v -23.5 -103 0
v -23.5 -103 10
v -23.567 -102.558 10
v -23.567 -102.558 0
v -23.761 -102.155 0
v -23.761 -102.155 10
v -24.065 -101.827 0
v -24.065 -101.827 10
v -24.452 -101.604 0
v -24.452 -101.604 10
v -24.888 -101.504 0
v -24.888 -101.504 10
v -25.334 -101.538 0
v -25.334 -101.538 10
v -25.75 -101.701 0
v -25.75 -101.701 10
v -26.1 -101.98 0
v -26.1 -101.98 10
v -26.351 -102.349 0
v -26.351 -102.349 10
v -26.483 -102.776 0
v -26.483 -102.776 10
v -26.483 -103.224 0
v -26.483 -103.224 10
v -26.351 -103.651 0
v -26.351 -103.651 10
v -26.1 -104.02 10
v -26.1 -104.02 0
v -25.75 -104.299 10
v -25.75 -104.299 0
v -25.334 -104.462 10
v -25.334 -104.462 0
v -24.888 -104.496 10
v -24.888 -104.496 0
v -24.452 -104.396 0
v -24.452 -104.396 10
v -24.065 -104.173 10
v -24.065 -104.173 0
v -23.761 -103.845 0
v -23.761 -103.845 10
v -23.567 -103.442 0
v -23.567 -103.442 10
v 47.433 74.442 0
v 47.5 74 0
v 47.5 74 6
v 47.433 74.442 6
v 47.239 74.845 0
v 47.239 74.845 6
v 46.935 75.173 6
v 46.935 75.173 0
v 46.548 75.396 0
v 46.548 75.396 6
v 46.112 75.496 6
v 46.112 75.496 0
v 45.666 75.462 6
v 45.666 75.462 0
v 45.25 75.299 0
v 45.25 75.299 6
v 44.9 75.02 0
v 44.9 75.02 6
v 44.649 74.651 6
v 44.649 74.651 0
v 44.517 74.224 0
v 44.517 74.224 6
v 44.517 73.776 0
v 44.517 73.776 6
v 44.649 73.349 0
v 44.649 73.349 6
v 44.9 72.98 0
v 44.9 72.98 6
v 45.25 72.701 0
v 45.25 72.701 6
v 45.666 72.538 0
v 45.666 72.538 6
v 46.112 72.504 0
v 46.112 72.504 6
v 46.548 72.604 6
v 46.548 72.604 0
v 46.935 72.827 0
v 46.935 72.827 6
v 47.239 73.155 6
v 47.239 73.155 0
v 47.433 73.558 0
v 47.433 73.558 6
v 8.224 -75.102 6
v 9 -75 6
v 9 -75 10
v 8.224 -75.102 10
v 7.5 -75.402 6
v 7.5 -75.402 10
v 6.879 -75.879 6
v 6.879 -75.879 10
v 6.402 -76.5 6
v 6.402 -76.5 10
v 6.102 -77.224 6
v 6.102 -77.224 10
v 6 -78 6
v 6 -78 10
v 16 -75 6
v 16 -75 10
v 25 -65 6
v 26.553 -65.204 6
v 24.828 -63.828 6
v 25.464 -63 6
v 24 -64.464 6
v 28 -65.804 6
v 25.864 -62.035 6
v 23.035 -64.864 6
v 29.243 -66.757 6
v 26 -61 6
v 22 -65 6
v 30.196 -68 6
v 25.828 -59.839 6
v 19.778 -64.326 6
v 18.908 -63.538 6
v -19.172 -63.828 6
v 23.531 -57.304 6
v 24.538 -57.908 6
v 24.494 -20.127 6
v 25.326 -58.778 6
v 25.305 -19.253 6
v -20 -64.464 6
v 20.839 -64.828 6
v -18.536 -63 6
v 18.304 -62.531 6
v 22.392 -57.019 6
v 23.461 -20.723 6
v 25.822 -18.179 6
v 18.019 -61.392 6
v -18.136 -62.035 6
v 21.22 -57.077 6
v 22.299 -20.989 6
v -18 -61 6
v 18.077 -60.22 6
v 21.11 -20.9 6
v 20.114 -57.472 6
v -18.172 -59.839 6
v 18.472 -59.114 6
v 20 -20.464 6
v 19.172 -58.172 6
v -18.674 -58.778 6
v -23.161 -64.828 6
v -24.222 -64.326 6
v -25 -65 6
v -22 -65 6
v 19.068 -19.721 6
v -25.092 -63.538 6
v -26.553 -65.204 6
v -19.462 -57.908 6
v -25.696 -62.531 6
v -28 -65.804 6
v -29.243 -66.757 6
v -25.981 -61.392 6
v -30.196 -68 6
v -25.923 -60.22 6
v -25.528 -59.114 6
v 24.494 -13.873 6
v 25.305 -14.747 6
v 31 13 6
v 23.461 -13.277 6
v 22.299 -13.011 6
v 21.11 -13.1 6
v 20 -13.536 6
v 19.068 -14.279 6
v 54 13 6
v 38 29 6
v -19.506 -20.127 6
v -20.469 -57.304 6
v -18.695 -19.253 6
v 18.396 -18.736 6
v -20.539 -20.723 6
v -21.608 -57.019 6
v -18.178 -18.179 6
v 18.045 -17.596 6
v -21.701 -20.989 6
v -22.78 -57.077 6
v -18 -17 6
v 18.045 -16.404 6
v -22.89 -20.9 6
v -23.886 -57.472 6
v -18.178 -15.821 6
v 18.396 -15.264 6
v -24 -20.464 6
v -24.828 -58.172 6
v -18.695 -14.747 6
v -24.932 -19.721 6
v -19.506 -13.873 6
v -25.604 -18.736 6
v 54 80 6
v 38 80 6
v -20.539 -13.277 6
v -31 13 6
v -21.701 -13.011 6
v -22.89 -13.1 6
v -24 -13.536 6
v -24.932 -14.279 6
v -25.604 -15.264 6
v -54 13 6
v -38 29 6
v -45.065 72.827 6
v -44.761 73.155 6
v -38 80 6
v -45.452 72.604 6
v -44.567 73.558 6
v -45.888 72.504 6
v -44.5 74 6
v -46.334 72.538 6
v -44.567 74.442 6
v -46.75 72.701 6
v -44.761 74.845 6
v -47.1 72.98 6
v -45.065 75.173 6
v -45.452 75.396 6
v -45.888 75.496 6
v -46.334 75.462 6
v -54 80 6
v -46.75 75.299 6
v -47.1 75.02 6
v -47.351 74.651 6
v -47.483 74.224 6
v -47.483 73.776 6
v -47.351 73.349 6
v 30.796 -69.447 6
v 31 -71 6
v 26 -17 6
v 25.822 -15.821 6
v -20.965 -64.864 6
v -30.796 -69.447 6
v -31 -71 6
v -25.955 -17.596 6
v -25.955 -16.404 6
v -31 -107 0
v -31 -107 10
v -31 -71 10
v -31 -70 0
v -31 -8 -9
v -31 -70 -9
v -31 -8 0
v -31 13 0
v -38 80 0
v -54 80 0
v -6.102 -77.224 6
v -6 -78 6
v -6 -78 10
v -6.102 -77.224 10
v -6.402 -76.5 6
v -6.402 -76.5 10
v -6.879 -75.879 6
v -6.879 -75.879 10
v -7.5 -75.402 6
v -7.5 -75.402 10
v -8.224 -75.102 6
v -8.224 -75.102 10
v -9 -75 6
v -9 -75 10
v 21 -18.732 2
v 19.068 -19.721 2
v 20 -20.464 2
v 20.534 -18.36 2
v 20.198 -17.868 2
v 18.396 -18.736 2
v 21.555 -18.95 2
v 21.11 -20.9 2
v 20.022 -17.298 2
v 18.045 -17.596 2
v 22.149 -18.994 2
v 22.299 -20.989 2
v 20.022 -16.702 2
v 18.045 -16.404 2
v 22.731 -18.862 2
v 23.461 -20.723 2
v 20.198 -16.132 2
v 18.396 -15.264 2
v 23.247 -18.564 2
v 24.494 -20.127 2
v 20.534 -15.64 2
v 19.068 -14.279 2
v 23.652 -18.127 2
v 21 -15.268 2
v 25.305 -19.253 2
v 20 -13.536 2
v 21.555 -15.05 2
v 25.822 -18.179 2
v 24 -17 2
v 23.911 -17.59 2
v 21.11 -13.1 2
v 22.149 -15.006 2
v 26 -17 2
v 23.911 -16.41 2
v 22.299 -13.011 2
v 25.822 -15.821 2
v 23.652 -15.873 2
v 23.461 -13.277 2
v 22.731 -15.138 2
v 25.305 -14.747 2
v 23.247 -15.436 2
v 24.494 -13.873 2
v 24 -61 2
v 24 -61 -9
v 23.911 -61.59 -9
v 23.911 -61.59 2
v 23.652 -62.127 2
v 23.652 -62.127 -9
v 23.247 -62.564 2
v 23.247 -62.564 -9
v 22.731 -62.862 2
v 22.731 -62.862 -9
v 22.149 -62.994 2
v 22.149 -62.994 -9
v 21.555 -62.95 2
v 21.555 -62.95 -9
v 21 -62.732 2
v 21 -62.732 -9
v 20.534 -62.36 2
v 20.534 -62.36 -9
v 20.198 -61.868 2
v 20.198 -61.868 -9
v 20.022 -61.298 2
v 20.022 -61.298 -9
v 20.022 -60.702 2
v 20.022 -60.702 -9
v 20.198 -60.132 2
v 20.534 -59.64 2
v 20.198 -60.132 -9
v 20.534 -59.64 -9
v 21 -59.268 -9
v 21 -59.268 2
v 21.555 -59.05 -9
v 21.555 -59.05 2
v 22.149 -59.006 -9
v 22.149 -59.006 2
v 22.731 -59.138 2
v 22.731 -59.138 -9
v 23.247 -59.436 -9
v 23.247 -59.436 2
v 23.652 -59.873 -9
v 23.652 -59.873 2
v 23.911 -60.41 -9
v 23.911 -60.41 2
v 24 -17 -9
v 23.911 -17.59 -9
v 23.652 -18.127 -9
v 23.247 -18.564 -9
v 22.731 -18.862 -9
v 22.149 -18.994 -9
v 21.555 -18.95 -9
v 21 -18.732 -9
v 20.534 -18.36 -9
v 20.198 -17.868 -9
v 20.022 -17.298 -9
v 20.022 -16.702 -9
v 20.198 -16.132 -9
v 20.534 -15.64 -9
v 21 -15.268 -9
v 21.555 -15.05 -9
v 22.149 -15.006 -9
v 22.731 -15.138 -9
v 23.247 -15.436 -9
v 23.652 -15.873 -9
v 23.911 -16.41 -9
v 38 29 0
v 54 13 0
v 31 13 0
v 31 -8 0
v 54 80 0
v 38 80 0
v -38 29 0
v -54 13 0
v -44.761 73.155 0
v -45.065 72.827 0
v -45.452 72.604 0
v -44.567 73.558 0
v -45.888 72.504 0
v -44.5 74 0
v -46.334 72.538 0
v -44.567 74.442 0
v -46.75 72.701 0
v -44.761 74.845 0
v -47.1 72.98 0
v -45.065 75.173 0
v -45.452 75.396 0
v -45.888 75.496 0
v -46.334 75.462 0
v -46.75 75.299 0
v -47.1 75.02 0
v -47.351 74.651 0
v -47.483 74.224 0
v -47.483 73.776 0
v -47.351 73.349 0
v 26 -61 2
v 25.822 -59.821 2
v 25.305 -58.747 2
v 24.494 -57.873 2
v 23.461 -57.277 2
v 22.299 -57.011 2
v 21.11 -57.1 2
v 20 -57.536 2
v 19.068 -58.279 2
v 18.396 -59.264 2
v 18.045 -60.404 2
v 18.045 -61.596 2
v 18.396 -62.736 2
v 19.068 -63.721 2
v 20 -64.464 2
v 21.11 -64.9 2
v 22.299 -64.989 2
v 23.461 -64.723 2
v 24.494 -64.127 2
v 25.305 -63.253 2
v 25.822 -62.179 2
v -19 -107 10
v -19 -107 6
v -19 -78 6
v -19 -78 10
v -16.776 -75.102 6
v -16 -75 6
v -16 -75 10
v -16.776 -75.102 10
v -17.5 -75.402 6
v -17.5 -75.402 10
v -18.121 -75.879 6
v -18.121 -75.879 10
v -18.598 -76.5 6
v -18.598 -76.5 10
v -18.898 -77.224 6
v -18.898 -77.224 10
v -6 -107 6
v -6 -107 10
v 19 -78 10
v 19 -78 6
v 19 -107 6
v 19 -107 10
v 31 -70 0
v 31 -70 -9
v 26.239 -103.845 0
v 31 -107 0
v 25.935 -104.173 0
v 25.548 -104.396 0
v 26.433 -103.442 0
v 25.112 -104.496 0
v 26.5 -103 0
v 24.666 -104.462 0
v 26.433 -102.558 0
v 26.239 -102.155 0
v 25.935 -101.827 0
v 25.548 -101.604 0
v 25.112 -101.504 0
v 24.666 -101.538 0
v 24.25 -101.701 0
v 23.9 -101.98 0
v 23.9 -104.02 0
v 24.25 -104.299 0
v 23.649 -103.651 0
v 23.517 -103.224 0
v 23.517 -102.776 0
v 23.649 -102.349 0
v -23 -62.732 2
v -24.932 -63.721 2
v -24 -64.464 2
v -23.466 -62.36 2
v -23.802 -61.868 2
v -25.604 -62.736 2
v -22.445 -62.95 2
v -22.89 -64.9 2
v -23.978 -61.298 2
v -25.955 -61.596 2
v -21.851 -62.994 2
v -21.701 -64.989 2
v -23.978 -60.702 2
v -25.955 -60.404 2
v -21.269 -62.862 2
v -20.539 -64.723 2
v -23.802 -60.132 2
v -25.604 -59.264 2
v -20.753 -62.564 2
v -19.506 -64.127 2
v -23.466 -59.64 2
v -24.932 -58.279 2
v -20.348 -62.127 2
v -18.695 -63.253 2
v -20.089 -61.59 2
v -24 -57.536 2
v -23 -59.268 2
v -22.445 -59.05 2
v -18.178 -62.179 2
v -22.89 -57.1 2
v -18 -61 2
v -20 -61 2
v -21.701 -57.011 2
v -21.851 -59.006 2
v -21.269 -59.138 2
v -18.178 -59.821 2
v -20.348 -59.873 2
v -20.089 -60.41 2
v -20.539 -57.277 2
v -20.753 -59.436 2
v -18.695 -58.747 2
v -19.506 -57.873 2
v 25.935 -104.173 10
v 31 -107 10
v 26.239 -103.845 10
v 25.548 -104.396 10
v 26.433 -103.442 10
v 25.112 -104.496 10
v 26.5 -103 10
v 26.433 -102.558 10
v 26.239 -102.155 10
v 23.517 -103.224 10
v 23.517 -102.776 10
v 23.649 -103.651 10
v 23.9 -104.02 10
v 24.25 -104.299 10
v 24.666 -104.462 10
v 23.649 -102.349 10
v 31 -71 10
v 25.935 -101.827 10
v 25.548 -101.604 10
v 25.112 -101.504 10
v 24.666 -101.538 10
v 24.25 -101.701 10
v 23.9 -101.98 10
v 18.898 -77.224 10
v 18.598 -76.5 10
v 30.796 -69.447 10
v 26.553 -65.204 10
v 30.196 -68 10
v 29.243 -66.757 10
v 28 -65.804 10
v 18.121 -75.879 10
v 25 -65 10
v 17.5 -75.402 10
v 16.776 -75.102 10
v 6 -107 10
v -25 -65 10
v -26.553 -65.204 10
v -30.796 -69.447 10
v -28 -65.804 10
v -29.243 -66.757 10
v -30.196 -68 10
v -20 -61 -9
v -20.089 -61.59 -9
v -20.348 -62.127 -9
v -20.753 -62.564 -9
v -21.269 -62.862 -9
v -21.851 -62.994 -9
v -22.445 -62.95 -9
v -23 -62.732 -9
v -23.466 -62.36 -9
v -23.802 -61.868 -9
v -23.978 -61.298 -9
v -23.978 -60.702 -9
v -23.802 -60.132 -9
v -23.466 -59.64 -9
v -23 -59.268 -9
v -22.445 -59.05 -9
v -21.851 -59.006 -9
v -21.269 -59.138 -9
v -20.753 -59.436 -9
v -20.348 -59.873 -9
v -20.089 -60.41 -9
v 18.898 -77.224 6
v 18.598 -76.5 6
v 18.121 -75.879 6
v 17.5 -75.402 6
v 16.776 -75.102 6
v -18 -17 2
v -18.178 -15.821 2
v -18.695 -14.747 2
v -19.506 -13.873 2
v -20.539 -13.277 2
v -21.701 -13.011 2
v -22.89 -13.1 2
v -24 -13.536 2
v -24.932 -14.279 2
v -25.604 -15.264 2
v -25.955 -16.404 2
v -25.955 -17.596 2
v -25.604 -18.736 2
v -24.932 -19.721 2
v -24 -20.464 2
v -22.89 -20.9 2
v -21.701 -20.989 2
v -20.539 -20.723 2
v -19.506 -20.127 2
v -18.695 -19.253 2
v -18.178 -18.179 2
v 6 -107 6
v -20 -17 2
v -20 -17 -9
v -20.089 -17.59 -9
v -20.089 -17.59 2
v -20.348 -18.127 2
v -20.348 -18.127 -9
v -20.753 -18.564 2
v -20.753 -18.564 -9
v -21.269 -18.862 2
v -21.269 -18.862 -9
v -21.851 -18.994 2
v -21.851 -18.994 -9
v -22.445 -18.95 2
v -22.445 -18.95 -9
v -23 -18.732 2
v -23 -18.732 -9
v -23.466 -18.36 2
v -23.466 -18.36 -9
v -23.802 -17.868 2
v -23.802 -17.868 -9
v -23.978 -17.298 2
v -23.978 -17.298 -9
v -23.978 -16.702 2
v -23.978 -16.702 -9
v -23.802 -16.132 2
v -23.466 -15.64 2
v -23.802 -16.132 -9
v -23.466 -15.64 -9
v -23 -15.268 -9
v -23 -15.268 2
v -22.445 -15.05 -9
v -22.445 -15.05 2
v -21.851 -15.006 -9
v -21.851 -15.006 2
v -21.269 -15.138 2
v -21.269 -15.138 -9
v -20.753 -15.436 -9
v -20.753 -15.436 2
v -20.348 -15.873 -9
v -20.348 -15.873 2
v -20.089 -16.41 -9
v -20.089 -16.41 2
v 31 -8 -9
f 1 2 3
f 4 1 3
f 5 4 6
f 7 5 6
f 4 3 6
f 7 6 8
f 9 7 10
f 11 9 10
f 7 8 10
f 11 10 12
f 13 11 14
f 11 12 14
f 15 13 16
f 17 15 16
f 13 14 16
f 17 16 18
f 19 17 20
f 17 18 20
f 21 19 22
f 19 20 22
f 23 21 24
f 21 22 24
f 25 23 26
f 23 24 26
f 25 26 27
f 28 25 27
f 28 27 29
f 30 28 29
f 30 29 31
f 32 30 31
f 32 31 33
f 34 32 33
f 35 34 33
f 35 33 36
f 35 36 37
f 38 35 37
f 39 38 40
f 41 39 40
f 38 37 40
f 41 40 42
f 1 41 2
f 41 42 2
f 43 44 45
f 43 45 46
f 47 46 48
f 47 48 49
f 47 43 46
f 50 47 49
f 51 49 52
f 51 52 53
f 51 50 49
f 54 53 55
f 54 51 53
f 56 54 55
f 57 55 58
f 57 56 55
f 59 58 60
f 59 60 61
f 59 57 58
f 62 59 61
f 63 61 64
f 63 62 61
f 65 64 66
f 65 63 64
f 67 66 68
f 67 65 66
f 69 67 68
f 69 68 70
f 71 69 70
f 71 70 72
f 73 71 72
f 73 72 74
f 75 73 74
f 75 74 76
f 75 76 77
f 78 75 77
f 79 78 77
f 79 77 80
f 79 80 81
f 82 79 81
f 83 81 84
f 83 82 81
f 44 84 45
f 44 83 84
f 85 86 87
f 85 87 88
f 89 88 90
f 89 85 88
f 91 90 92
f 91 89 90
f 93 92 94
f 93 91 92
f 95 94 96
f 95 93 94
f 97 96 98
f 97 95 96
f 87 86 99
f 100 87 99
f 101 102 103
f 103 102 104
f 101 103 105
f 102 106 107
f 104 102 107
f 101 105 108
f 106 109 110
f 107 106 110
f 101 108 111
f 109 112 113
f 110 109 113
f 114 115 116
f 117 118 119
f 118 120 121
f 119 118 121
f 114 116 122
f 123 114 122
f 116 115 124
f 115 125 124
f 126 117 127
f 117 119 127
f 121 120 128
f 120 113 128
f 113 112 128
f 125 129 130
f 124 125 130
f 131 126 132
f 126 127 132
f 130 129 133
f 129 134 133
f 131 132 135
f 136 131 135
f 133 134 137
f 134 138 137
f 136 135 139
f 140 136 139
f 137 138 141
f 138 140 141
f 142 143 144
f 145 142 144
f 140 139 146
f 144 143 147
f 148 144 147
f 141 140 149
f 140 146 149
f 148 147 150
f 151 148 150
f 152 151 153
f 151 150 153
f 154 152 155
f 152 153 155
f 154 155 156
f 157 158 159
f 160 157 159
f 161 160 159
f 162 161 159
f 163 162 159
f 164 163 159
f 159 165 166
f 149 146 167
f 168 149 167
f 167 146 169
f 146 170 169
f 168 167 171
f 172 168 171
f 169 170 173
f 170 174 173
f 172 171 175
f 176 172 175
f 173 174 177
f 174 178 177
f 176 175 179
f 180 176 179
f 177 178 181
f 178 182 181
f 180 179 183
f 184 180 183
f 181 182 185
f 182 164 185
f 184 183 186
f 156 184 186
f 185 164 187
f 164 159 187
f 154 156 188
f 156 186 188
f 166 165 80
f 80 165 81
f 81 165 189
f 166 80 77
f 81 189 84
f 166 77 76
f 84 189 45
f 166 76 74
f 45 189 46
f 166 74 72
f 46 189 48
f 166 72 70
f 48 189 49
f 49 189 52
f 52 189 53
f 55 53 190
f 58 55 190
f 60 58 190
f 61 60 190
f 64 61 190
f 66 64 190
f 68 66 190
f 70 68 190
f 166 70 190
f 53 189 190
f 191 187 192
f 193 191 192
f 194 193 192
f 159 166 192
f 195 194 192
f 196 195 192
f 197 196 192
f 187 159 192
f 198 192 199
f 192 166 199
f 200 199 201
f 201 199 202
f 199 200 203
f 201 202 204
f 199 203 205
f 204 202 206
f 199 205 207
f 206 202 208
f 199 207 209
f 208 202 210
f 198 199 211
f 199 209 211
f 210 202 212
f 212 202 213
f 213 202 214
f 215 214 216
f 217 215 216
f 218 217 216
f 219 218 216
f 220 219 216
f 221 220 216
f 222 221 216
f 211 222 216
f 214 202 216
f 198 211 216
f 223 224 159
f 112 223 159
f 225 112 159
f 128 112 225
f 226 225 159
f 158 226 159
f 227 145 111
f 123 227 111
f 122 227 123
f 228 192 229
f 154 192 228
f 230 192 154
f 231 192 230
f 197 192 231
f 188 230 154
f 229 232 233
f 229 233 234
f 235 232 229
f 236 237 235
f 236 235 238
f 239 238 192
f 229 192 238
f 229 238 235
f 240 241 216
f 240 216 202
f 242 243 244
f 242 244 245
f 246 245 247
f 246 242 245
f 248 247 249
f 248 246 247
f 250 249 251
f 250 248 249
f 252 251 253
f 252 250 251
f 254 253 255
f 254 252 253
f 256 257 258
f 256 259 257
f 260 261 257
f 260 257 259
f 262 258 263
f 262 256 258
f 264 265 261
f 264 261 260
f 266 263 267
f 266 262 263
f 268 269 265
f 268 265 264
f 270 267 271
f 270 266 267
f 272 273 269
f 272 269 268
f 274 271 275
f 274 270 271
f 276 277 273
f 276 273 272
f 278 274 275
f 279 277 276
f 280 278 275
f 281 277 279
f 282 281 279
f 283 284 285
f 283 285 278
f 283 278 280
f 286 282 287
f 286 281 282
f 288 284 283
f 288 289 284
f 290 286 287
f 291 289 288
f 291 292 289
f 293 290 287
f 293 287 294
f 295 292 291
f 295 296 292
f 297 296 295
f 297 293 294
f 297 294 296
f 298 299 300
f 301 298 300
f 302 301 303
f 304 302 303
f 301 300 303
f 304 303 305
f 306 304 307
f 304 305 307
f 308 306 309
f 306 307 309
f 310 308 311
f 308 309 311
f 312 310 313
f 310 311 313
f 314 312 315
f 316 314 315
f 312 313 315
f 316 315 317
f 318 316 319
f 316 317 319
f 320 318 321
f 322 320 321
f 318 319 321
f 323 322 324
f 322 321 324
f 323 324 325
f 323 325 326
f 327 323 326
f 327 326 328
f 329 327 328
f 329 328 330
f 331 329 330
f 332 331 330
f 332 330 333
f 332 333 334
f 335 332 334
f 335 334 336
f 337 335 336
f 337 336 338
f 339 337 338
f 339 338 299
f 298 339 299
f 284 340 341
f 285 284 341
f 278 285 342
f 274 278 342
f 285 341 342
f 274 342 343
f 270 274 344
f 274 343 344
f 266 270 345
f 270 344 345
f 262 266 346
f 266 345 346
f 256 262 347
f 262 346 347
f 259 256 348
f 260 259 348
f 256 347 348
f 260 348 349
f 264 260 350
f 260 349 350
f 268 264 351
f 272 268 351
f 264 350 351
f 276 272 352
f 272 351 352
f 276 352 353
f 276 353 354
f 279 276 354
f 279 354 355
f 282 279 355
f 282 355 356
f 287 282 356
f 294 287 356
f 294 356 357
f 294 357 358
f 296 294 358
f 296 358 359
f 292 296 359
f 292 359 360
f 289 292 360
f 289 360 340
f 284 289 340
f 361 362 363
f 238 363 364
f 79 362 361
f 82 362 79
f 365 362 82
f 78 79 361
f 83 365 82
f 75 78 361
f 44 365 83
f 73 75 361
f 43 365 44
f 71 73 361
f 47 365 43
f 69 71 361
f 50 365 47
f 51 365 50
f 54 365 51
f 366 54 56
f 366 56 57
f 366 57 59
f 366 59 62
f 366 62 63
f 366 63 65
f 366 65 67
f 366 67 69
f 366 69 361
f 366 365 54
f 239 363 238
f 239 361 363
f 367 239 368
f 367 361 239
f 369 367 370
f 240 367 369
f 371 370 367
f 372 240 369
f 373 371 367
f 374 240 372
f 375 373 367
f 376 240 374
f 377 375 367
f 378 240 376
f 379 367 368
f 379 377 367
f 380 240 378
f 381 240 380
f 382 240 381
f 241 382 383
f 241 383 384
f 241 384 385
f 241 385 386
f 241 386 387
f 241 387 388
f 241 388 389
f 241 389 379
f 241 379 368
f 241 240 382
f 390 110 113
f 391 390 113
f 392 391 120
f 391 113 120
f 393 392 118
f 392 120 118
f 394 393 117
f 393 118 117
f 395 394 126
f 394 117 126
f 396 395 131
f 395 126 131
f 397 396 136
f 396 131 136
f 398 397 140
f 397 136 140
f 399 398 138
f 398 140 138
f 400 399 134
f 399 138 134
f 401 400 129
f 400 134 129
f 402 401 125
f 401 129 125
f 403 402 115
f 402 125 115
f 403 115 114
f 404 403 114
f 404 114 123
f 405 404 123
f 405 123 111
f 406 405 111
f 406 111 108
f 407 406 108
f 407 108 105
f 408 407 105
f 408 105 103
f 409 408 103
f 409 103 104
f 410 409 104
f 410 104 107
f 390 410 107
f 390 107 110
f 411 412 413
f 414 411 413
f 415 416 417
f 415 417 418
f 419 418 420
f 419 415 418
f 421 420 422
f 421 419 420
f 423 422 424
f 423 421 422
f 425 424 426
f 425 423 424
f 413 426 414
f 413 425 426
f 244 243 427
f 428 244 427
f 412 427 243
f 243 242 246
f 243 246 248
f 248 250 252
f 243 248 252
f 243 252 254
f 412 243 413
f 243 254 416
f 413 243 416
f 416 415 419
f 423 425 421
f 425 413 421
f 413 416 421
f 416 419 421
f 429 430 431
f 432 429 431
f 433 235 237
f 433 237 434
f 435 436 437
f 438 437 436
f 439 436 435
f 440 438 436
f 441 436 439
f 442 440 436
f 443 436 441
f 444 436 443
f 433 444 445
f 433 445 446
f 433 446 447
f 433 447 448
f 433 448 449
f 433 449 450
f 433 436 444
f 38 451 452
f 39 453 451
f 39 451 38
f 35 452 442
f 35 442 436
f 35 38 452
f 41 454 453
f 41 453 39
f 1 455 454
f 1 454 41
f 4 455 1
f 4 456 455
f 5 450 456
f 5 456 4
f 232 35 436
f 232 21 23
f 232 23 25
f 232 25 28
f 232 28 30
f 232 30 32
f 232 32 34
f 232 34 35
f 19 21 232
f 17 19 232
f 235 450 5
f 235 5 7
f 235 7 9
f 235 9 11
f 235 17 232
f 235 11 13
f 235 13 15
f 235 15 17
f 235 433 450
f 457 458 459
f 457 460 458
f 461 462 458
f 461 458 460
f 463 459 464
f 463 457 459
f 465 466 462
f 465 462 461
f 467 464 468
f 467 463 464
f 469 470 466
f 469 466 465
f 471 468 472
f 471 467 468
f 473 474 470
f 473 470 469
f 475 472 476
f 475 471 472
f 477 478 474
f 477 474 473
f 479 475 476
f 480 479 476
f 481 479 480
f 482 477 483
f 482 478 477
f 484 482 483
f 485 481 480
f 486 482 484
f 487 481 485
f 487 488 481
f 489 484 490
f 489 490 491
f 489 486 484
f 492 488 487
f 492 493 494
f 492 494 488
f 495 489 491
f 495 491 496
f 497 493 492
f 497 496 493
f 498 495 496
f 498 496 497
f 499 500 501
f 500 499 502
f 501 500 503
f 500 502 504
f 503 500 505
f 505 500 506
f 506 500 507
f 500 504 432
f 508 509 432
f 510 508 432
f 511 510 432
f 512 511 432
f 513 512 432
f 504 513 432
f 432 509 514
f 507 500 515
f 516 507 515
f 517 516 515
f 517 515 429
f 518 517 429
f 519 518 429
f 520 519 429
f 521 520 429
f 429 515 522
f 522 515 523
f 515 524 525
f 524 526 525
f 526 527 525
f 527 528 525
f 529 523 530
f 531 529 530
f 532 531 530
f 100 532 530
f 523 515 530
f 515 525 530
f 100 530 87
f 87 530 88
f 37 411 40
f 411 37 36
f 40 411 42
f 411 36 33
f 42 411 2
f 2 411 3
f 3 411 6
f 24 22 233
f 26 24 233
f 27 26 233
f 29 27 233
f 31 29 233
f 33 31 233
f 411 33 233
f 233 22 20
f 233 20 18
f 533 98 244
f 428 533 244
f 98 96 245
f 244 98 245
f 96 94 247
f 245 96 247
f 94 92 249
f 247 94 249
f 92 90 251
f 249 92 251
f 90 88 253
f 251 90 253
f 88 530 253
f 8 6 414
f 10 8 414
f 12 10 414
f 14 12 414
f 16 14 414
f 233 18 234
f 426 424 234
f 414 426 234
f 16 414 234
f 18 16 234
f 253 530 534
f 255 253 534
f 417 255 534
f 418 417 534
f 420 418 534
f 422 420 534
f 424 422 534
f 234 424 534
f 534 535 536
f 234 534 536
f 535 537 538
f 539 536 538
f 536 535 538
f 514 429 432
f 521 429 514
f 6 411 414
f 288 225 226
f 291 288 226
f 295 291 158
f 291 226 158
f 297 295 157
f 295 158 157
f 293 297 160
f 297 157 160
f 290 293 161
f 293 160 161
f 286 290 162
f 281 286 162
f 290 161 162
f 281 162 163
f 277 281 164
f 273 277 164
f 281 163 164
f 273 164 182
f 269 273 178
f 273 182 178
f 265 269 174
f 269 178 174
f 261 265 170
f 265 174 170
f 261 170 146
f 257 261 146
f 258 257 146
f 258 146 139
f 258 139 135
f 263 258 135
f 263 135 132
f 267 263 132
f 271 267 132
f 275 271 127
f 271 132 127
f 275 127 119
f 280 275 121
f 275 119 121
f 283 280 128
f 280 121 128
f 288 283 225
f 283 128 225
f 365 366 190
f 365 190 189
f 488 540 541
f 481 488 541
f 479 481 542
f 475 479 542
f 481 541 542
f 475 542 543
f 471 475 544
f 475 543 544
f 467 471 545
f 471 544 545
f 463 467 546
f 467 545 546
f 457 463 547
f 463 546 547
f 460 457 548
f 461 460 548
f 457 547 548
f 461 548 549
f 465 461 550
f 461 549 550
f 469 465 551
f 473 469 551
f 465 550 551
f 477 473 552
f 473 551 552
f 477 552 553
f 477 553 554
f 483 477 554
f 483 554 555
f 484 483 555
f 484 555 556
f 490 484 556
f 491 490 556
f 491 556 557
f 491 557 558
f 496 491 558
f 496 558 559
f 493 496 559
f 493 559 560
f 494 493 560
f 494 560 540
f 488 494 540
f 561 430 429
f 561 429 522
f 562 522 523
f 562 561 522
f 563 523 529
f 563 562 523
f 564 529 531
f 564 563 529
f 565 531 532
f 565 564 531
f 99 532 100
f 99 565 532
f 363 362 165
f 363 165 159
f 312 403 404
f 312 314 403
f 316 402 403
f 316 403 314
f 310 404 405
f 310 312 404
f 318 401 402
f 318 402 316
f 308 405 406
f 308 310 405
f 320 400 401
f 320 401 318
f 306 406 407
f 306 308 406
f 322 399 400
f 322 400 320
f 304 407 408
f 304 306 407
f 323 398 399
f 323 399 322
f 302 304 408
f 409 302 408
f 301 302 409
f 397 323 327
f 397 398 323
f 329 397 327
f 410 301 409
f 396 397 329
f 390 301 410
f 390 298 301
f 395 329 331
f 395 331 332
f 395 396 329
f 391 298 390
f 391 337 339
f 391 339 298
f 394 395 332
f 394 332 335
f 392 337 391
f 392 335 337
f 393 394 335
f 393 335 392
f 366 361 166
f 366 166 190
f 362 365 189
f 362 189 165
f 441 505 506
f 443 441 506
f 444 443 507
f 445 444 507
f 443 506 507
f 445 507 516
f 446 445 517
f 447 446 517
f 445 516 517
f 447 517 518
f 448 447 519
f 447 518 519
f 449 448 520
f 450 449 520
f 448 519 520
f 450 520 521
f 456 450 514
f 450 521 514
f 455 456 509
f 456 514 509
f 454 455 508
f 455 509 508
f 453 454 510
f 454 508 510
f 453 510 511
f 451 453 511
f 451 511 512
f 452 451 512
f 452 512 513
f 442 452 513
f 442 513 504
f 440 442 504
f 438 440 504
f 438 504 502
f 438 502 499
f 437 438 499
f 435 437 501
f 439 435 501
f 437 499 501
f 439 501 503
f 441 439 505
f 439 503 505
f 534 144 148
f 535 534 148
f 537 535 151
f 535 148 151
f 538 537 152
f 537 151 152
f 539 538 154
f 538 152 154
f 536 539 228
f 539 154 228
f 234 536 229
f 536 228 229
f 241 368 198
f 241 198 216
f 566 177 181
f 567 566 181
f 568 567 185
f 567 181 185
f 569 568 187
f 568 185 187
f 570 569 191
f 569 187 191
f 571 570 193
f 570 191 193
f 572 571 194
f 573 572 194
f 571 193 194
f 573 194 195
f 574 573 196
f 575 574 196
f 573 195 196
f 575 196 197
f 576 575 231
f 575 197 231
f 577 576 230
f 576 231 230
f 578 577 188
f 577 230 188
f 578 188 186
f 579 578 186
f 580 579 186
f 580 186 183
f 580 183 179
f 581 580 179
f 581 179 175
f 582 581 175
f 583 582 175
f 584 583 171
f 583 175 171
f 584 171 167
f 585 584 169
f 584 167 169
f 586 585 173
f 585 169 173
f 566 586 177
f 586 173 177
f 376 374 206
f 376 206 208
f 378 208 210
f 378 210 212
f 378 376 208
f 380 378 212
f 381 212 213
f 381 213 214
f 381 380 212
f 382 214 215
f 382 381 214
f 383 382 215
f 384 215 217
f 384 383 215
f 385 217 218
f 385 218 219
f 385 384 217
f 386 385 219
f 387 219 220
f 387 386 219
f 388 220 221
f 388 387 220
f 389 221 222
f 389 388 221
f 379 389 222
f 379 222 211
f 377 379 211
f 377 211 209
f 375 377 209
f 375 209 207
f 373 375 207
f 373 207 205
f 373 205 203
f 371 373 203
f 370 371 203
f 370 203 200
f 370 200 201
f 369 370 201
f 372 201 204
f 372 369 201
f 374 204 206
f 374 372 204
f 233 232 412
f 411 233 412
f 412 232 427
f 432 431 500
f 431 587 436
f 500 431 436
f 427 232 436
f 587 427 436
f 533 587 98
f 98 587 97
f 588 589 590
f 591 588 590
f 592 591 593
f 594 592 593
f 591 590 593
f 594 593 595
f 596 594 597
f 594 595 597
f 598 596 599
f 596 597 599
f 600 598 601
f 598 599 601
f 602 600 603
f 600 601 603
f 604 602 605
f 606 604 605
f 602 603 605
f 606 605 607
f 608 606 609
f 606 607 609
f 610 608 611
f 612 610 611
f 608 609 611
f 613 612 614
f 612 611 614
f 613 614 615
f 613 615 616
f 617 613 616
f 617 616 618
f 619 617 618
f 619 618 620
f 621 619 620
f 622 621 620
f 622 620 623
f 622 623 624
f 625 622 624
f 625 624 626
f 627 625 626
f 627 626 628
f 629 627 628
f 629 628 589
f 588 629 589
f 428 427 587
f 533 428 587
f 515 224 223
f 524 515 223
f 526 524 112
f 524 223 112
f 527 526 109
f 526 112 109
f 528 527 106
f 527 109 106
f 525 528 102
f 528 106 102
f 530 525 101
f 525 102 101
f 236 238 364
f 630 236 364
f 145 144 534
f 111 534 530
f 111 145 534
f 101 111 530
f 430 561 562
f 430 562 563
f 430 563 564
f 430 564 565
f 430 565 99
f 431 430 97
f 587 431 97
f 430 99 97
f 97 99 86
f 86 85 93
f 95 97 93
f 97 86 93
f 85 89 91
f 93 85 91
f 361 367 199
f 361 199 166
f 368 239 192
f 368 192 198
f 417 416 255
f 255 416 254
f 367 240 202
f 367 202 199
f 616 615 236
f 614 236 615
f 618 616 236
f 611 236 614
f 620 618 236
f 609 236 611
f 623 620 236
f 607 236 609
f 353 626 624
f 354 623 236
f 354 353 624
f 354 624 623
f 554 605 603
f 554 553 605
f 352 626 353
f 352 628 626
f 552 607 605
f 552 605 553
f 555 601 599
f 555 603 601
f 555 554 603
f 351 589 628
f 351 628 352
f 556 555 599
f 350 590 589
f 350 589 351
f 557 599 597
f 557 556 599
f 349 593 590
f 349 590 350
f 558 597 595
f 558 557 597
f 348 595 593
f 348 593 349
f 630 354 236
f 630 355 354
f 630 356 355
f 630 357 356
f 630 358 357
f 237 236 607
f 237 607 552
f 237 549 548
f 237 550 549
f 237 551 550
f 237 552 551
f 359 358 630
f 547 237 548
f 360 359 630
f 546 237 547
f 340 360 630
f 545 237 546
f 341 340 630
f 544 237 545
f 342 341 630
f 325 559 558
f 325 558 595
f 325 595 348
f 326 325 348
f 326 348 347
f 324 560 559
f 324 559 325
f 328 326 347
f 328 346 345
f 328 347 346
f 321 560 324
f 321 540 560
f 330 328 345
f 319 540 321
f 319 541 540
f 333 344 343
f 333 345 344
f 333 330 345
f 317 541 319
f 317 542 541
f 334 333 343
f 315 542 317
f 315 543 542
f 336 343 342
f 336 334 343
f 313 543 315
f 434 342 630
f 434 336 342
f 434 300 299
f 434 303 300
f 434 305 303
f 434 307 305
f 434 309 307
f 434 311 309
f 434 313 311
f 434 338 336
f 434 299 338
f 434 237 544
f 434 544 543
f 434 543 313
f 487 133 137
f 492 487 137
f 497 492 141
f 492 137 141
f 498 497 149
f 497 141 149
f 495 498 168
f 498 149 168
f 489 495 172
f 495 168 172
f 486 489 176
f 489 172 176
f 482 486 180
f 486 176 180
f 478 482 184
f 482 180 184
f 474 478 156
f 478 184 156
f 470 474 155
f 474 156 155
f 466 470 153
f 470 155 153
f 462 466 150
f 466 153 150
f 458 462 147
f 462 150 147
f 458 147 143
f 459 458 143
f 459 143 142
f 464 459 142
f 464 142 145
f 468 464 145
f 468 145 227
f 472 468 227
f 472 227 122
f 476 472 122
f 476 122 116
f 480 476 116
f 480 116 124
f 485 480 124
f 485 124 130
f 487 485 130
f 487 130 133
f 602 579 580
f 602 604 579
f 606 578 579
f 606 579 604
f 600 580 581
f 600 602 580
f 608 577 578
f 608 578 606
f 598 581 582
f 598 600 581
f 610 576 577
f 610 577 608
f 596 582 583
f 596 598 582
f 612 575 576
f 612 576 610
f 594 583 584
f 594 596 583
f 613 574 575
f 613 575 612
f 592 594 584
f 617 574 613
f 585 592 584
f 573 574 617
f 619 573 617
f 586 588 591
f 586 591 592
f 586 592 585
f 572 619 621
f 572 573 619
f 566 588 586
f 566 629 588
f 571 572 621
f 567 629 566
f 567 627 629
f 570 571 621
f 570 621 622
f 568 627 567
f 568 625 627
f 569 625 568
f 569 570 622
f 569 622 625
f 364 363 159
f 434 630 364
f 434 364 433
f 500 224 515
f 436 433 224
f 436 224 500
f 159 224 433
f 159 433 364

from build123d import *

# Parameters (mm, degrees)
SKETCH_R        = 1.5
PAD_DEPTH       = 6
PAD001_DEPTH    = 4
SKETCH002_R     = 1.5
POCKET_DEPTH    = 10
SKETCH003_W     = 62
SKETCH003_H     = 62
PAD002_DEPTH    = 9
SKETCH004_R     = 2
POCKET001_DEPTH = 15
SKETCH005_R     = 4
POCKET002_DEPTH = 4


with BuildPart() as part:
    # Sketch → Pad (new body)
    with BuildSketch(Plane.XY):
        Polygon((-38, 29), (38, 29), (38, 80), (54, 80), (54, 13), (31, 13), (31, -107), (-31, -107), (-31, 13), (-54, 13), (-54, 80), (-38, 80), align=None)
        with Locations((46, 74)):
            Circle(SKETCH_R, mode=Mode.SUBTRACT)
        with Locations((-46, 74)):
            Circle(SKETCH_R, mode=Mode.SUBTRACT)
    extrude(amount=PAD_DEPTH)

    # Sketch001 (on Face16 of Pad) → Pad001 (join)
    with BuildSketch(Plane.XY.offset(6)):
        with BuildLine():
            Line((31, -71), (31, -107))
            Line((19, -107), (31, -107))
            Line((19, -78.000015), (19, -107))
            ThreePointArc((19, -78.000015), (18.12132, -75.878696), (16.000001, -75.000016))
            Line((8.999999, -75.000016), (16.000001, -75.000016))
            ThreePointArc((8.999999, -75.000016), (6.878678, -75.878697), (6, -78.000019))
            Line((6, -107.000009), (6, -78.000019))
            Line((-6, -107.000009), (6, -107.000009))
            Line((-6, -78.000019), (-6, -107.000009))
            ThreePointArc((-6, -78.000019), (-6.878676, -75.878693), (-8.999999, -75.000009))
            Line((-16.000001, -75.000009), (-8.999999, -75.000009))
            ThreePointArc((-16.000001, -75.000009), (-18.12132, -75.878689), (-19, -78.000009))
            Line((-19, -107), (-19, -78.000009))
            Line((-31, -107), (-19, -107))
            Line((-31, -107), (-31, -71))
            ThreePointArc((-25, -65), (-29.242641, -66.757359), (-31, -71))
            Line((-25, -65), (25, -65))
            ThreePointArc((31, -71), (29.242641, -66.757359), (25, -65))
        make_face()
    extrude(amount=PAD001_DEPTH)

    # Sketch002 (on Face27 of Pad001) → Pocket (cut)
    with BuildSketch(Plane.XY.offset(10)):
        with Locations((-25, -103)):
            Circle(SKETCH002_R)
        with Locations((25, -103)):
            Circle(SKETCH002_R)
    extrude(amount=-POCKET_DEPTH, mode=Mode.SUBTRACT)

    # Sketch003 (on Face4 of Pocket) → Pad002 (join)
    with BuildSketch(Plane(origin=(0, 0, 0), x_dir=(1, 0, 0), z_dir=(0, 0, -1))):
        with Locations((0, 39)):
            Rectangle(SKETCH003_W, SKETCH003_H)
    extrude(amount=PAD002_DEPTH)

    # Sketch004 (on Face25 of Pad002) → Pocket001 (cut)
    with BuildSketch(Plane(origin=(0, 0, -9), x_dir=(1, 0, 0), z_dir=(0, 0, -1))):
        with Locations((-22, 61)):
            Circle(SKETCH004_R)
        with Locations((22, 61)):
            Circle(SKETCH004_R)
        with Locations((22, 17)):
            Circle(SKETCH004_R)
        with Locations((-22, 17)):
            Circle(SKETCH004_R)
    extrude(amount=-POCKET001_DEPTH, mode=Mode.SUBTRACT)

    # Sketch005 (on Face5 of Pocket001) → Pocket002 (cut)
    with BuildSketch(Plane.XY.offset(6)):
        with Locations((-22, -61)):
            Circle(SKETCH005_R)
        with Locations((22, -61)):
            Circle(SKETCH005_R)
        with Locations((22, -17)):
            Circle(SKETCH005_R)
        with Locations((-22, -17)):
            Circle(SKETCH005_R)
    extrude(amount=-POCKET002_DEPTH, mode=Mode.SUBTRACT)


solid = part.part
